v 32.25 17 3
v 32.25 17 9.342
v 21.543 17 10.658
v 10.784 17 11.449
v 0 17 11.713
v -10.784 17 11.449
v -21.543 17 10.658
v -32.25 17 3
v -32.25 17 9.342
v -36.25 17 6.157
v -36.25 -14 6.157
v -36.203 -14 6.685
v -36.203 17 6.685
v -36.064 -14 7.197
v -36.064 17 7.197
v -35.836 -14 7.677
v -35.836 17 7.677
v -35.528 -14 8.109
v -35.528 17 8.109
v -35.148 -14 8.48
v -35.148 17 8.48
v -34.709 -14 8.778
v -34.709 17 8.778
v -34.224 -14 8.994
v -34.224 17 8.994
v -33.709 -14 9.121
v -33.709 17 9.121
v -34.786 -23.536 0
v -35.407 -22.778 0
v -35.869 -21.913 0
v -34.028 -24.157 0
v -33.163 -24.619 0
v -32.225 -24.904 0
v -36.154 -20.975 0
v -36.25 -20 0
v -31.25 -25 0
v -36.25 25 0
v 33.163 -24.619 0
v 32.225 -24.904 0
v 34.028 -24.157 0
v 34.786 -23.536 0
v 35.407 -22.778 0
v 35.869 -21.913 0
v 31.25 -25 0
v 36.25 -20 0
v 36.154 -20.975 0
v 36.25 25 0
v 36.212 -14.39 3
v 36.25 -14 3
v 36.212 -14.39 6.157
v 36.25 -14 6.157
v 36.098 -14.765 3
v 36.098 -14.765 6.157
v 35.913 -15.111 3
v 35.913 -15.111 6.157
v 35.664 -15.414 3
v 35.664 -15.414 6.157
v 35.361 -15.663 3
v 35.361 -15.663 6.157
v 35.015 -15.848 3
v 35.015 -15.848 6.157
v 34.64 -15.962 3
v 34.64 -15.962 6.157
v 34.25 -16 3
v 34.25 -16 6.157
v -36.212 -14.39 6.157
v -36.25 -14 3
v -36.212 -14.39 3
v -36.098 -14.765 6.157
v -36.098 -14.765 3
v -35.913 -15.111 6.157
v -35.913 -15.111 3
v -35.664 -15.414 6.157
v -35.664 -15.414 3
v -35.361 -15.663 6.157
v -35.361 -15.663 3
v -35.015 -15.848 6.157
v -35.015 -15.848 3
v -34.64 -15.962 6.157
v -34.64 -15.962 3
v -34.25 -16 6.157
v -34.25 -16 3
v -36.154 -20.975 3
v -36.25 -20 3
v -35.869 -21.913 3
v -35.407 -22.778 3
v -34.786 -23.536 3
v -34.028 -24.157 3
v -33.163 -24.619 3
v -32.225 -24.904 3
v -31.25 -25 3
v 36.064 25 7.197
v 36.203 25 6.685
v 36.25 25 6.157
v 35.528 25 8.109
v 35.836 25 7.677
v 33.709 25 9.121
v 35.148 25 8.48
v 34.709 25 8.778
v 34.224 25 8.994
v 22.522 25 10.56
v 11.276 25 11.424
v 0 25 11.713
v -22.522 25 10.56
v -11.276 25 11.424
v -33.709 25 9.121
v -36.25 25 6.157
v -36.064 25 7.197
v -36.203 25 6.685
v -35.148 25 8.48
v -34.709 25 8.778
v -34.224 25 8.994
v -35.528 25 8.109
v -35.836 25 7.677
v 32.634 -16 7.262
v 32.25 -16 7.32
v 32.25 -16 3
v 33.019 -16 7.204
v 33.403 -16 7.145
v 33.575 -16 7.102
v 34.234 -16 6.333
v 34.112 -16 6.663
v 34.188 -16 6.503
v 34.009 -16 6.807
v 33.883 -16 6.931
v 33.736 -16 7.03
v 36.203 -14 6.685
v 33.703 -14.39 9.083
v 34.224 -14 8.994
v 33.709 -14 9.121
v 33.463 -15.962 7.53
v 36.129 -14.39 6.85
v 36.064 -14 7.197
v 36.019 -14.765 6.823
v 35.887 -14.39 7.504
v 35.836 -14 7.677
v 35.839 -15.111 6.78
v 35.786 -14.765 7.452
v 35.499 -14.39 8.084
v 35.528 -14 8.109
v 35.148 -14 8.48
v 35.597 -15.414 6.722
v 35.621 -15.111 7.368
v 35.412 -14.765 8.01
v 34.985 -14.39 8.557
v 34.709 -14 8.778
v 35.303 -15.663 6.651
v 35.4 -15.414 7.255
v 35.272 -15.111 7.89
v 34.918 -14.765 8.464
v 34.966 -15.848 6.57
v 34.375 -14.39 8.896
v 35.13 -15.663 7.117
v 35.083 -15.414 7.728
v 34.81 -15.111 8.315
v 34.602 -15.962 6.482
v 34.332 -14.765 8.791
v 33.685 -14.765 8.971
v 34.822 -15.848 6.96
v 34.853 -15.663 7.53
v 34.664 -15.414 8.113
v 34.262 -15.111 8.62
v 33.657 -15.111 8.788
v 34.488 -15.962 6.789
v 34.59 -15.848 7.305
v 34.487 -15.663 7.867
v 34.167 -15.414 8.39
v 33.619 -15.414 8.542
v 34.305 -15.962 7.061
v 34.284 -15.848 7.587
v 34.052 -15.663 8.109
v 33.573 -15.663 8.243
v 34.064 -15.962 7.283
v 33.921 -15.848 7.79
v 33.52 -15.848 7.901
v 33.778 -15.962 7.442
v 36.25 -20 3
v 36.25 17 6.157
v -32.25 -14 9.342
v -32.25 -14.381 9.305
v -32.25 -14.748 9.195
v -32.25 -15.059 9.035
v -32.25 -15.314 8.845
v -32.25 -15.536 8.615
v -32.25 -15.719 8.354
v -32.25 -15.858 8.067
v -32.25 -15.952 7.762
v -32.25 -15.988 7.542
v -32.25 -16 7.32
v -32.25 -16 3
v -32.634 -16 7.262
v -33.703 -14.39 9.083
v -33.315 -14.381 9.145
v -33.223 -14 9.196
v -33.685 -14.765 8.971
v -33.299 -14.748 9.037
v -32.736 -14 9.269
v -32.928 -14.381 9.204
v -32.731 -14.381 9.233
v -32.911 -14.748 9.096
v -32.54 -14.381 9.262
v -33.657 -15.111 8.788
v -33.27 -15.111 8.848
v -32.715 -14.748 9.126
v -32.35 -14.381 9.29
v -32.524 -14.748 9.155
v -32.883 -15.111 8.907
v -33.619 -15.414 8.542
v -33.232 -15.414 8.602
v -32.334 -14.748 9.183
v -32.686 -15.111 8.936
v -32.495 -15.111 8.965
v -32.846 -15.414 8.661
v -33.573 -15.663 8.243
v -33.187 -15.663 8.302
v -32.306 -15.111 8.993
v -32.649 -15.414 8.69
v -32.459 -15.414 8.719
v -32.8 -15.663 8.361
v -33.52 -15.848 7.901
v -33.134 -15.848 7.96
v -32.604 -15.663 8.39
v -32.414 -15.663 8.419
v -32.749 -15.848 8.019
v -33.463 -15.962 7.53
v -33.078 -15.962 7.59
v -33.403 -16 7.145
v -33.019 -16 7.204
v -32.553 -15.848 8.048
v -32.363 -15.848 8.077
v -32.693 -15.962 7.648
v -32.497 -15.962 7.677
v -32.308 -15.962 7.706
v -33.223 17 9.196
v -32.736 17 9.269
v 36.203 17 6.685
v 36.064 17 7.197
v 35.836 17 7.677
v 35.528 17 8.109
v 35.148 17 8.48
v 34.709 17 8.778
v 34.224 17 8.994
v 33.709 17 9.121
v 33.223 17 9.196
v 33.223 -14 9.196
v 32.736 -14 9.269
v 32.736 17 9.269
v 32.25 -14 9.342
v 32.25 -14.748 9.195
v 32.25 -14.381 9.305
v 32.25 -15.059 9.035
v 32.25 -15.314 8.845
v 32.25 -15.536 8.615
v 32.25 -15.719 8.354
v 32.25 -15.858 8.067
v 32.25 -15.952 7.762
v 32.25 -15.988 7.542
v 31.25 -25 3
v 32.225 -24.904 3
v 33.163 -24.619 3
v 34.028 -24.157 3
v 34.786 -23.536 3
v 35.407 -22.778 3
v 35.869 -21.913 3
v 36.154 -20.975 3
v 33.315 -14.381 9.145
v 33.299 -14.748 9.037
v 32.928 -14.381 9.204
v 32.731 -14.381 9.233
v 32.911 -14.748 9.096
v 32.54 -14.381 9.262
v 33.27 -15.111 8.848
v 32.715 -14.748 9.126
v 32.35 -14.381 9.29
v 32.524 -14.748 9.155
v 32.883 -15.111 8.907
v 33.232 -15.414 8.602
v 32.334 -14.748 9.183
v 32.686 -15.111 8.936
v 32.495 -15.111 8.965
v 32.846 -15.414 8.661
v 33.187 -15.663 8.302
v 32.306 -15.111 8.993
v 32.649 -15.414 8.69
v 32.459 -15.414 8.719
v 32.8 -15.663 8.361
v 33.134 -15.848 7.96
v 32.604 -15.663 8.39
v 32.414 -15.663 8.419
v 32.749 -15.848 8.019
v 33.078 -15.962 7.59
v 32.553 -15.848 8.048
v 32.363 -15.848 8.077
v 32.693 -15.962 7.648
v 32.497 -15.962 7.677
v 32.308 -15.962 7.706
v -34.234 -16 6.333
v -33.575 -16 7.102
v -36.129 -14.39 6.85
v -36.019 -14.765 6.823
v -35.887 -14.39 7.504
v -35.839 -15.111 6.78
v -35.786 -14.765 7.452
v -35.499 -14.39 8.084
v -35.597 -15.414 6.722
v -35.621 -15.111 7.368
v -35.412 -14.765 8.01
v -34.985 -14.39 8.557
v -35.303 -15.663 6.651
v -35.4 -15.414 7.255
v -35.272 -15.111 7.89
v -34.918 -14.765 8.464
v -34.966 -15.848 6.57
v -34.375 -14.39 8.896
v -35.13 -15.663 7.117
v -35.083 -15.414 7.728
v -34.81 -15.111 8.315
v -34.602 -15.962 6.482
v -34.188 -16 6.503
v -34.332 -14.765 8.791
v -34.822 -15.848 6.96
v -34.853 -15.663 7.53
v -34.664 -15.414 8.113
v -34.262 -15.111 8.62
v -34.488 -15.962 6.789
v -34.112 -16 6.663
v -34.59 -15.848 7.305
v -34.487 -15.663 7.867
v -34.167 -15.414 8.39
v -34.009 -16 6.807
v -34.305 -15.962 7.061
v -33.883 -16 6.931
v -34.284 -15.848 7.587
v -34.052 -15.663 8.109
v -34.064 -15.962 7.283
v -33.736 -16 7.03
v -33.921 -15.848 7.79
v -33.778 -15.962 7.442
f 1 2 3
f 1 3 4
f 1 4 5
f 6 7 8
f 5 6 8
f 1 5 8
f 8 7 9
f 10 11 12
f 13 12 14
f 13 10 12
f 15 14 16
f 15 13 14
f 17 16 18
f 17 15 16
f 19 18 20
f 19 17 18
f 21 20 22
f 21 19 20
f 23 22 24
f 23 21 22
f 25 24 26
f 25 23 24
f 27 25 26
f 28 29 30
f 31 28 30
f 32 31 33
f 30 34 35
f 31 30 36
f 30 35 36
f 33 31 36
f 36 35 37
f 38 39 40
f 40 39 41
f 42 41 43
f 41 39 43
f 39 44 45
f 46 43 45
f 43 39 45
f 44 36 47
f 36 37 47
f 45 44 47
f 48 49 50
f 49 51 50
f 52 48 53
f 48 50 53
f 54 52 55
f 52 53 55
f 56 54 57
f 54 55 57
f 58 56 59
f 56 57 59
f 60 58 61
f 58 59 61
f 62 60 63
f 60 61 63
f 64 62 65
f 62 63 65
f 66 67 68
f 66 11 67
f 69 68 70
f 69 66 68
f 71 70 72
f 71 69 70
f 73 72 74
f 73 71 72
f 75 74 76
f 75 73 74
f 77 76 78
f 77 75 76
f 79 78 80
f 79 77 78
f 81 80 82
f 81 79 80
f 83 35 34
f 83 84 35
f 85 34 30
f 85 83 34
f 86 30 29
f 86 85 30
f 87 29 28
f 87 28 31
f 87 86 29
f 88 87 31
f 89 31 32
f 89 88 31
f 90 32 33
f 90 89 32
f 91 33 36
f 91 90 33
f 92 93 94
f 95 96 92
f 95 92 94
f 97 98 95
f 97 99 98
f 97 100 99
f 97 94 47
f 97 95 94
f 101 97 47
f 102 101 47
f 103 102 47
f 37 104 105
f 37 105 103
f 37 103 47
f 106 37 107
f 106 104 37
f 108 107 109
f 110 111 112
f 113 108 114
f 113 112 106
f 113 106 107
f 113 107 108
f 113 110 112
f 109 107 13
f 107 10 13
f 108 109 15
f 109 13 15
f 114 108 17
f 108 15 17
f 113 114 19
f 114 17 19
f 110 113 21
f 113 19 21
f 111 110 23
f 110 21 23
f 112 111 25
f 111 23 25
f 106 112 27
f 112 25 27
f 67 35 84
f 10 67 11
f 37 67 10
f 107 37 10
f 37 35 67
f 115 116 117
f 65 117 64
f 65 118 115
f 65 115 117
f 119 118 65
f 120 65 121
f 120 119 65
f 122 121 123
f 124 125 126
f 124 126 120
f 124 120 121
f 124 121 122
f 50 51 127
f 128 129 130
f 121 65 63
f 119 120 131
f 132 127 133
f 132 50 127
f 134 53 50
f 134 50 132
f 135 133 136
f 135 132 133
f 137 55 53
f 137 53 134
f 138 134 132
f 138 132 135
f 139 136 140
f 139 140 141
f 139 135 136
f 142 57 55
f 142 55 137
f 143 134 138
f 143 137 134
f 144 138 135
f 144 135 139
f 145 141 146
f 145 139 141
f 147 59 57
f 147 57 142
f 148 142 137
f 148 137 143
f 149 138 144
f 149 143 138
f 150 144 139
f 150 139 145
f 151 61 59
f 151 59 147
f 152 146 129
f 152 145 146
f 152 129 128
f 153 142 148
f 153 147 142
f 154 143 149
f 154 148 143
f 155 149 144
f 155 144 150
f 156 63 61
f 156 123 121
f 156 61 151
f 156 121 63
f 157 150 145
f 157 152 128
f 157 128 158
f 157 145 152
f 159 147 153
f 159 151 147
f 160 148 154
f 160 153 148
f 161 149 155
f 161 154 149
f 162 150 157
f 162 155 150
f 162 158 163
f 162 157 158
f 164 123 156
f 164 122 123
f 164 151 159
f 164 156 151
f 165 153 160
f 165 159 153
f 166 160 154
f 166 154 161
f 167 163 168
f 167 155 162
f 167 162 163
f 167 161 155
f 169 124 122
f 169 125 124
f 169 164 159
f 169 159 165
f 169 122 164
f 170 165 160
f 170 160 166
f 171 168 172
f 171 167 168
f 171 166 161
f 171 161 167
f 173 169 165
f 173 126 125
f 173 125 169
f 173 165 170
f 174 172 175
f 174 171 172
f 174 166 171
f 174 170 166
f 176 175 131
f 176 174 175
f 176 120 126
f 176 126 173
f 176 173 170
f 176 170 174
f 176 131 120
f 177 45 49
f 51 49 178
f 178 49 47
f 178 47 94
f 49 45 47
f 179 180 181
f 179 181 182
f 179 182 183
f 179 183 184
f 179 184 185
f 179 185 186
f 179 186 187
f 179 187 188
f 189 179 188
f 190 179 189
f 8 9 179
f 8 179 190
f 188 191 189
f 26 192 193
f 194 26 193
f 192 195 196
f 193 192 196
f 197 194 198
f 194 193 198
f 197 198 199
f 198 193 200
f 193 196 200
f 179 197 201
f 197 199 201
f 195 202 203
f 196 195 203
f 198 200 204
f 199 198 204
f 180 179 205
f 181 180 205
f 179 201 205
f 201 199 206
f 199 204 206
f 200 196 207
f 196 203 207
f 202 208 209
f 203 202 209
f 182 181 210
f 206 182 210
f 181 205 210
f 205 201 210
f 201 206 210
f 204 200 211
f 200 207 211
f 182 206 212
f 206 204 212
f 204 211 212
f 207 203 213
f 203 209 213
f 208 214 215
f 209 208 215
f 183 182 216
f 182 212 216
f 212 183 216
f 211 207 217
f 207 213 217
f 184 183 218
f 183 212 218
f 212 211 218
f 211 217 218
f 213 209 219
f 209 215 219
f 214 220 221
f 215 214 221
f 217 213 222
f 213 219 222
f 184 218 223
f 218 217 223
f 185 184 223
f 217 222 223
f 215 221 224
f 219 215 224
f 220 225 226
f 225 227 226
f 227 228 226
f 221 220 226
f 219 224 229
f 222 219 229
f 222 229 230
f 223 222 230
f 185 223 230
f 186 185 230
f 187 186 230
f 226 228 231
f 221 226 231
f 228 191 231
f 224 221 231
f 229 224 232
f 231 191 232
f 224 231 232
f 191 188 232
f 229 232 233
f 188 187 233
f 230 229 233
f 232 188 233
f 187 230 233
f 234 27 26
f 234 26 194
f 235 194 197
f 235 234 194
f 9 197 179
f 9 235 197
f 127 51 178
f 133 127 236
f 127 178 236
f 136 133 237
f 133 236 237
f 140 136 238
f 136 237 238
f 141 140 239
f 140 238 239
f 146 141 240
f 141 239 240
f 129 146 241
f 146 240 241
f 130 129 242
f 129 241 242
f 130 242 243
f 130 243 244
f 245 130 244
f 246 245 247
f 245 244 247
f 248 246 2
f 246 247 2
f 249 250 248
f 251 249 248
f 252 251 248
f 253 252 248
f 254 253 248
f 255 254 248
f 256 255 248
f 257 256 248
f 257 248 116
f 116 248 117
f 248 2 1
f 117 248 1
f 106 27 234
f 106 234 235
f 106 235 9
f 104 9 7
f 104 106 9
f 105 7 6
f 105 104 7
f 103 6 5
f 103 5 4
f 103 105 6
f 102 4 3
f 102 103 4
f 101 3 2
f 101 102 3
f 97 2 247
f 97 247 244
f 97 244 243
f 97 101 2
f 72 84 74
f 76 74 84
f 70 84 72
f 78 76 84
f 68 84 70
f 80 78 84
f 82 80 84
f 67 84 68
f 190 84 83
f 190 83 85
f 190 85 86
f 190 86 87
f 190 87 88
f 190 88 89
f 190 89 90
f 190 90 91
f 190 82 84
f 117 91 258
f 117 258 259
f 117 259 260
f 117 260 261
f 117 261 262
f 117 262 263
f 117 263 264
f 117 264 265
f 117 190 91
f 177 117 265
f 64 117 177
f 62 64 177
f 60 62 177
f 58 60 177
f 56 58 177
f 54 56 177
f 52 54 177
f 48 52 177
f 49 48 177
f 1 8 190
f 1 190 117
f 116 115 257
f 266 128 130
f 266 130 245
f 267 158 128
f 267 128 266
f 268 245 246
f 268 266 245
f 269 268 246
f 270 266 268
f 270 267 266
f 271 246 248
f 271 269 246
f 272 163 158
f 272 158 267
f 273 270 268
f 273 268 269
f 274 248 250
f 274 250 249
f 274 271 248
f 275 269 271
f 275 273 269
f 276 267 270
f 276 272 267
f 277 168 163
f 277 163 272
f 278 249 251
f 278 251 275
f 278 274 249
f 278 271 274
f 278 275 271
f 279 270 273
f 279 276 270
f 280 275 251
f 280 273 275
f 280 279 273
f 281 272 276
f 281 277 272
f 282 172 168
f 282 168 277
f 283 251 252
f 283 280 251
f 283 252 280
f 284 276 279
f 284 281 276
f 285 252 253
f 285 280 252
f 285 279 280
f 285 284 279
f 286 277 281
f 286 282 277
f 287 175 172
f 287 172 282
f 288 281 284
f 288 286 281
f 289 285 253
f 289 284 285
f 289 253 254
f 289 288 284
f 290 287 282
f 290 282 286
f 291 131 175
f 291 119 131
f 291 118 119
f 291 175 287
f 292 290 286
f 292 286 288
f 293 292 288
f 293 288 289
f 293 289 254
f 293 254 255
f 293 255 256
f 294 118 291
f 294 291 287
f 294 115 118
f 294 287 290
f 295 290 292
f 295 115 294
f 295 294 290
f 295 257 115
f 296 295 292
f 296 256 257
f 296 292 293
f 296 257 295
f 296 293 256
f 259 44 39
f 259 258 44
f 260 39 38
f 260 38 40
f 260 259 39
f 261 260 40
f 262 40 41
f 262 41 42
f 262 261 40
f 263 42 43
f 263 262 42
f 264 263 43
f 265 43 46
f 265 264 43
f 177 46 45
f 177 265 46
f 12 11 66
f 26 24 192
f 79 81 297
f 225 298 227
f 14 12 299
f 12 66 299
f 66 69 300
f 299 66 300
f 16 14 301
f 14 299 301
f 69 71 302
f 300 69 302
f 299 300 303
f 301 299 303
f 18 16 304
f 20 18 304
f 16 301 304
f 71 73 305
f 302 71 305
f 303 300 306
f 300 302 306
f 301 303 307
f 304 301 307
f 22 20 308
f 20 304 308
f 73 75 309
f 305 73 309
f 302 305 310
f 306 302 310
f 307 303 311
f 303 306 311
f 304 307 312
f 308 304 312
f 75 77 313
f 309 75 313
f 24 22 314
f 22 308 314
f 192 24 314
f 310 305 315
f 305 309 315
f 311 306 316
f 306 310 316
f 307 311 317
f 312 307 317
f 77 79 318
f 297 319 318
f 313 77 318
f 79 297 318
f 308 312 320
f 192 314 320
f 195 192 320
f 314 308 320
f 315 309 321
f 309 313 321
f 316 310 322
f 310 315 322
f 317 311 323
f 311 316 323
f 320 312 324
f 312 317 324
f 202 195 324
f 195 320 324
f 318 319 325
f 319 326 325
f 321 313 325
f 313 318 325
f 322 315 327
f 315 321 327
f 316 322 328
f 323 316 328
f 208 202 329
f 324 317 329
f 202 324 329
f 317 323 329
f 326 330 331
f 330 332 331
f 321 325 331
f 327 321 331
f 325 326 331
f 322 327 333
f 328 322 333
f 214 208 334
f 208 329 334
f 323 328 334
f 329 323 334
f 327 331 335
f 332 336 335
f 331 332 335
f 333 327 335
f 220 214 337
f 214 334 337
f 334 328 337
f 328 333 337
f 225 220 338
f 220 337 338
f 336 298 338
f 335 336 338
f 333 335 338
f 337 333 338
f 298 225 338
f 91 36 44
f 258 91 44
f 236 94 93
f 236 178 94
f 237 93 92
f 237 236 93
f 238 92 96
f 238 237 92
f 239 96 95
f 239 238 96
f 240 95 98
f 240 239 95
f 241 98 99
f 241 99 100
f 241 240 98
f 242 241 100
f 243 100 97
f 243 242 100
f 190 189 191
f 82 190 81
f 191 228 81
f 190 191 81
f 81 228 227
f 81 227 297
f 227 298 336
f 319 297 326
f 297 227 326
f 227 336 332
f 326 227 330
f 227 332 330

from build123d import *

# Parameters (mm, degrees)
F0_W     = 72.5
F0_H     = 50
F1_DEPTH = 3
F2_R     = 5
F4_DEPTH = 8
F5_R     = 3
F7_DEPTH = 33
F8_R     = 2


with BuildPart() as f1:
    # F0 (on Top) → F1 (new body)
    with BuildSketch(Plane.XY):
        Rectangle(F0_W, F0_H)
    extrude(amount=F1_DEPTH)

    # F2
    f2_edges = [f1.edges().sort_by_distance(p)[0] for p in [
        (36.25, -25, 1.5),
        (-36.25, -25, 1.5),
    ]]
    fillet(f2_edges, radius=F2_R)

    # F3 (on face) → F4 (join)
    with BuildSketch(Plane(origin=(0, 25, 0), x_dir=(-1, 0, 0), z_dir=(0, 1, 0))):
        with BuildLine():
            Line((36.25, 3), (36.25, 8.712942712))
            ThreePointArc((36.25, 8.712942712), (0, 11.712942712), (-36.25, 8.712942712))
            Line((-36.25, 8.712942712), (-36.25, 3))
            Line((-36.25, 3), (36.25, 3))
        make_face()
    extrude(amount=-F4_DEPTH)

    # F5
    f5_edges = [f1.edges().sort_by_distance(p)[0] for p in [
        (36.25, 21, 8.712943),
        (-36.25, 21, 8.712943),
    ]]
    fillet(f5_edges, radius=F5_R)

    # F6 (on face) → F7 (join)
    with BuildSketch(Plane.XZ.offset(-17)):
        with BuildLine():
            Line((32.25, 3), (36.25, 3))
            Line((36.25, 3), (36.25, 6.1565184682))
            ThreePointArc((36.25, 6.1565184682), (35.527695785, 8.1089789443), (33.7085987261, 9.1212591328))
            ThreePointArc((33.7085987261, 9.1212591328), (32.9794838617, 9.2327934458), (32.25, 9.3418882854))
            Line((32.25, 9.3418882854), (32.25, 3))
        make_face()
    extrude(amount=F7_DEPTH)

    # F8
    f8_edges = [f1.edges().sort_by_distance(p)[0] for p in [
        (36.25, -16, 4.578259),
    ]]
    fillet(f8_edges, radius=F8_R)

    # F9: F1 across plane


with BuildPart() as f1_1:
    add(f1.part)
    add(f1.part.mirror(Plane.YZ))


solid = f1_1.part
